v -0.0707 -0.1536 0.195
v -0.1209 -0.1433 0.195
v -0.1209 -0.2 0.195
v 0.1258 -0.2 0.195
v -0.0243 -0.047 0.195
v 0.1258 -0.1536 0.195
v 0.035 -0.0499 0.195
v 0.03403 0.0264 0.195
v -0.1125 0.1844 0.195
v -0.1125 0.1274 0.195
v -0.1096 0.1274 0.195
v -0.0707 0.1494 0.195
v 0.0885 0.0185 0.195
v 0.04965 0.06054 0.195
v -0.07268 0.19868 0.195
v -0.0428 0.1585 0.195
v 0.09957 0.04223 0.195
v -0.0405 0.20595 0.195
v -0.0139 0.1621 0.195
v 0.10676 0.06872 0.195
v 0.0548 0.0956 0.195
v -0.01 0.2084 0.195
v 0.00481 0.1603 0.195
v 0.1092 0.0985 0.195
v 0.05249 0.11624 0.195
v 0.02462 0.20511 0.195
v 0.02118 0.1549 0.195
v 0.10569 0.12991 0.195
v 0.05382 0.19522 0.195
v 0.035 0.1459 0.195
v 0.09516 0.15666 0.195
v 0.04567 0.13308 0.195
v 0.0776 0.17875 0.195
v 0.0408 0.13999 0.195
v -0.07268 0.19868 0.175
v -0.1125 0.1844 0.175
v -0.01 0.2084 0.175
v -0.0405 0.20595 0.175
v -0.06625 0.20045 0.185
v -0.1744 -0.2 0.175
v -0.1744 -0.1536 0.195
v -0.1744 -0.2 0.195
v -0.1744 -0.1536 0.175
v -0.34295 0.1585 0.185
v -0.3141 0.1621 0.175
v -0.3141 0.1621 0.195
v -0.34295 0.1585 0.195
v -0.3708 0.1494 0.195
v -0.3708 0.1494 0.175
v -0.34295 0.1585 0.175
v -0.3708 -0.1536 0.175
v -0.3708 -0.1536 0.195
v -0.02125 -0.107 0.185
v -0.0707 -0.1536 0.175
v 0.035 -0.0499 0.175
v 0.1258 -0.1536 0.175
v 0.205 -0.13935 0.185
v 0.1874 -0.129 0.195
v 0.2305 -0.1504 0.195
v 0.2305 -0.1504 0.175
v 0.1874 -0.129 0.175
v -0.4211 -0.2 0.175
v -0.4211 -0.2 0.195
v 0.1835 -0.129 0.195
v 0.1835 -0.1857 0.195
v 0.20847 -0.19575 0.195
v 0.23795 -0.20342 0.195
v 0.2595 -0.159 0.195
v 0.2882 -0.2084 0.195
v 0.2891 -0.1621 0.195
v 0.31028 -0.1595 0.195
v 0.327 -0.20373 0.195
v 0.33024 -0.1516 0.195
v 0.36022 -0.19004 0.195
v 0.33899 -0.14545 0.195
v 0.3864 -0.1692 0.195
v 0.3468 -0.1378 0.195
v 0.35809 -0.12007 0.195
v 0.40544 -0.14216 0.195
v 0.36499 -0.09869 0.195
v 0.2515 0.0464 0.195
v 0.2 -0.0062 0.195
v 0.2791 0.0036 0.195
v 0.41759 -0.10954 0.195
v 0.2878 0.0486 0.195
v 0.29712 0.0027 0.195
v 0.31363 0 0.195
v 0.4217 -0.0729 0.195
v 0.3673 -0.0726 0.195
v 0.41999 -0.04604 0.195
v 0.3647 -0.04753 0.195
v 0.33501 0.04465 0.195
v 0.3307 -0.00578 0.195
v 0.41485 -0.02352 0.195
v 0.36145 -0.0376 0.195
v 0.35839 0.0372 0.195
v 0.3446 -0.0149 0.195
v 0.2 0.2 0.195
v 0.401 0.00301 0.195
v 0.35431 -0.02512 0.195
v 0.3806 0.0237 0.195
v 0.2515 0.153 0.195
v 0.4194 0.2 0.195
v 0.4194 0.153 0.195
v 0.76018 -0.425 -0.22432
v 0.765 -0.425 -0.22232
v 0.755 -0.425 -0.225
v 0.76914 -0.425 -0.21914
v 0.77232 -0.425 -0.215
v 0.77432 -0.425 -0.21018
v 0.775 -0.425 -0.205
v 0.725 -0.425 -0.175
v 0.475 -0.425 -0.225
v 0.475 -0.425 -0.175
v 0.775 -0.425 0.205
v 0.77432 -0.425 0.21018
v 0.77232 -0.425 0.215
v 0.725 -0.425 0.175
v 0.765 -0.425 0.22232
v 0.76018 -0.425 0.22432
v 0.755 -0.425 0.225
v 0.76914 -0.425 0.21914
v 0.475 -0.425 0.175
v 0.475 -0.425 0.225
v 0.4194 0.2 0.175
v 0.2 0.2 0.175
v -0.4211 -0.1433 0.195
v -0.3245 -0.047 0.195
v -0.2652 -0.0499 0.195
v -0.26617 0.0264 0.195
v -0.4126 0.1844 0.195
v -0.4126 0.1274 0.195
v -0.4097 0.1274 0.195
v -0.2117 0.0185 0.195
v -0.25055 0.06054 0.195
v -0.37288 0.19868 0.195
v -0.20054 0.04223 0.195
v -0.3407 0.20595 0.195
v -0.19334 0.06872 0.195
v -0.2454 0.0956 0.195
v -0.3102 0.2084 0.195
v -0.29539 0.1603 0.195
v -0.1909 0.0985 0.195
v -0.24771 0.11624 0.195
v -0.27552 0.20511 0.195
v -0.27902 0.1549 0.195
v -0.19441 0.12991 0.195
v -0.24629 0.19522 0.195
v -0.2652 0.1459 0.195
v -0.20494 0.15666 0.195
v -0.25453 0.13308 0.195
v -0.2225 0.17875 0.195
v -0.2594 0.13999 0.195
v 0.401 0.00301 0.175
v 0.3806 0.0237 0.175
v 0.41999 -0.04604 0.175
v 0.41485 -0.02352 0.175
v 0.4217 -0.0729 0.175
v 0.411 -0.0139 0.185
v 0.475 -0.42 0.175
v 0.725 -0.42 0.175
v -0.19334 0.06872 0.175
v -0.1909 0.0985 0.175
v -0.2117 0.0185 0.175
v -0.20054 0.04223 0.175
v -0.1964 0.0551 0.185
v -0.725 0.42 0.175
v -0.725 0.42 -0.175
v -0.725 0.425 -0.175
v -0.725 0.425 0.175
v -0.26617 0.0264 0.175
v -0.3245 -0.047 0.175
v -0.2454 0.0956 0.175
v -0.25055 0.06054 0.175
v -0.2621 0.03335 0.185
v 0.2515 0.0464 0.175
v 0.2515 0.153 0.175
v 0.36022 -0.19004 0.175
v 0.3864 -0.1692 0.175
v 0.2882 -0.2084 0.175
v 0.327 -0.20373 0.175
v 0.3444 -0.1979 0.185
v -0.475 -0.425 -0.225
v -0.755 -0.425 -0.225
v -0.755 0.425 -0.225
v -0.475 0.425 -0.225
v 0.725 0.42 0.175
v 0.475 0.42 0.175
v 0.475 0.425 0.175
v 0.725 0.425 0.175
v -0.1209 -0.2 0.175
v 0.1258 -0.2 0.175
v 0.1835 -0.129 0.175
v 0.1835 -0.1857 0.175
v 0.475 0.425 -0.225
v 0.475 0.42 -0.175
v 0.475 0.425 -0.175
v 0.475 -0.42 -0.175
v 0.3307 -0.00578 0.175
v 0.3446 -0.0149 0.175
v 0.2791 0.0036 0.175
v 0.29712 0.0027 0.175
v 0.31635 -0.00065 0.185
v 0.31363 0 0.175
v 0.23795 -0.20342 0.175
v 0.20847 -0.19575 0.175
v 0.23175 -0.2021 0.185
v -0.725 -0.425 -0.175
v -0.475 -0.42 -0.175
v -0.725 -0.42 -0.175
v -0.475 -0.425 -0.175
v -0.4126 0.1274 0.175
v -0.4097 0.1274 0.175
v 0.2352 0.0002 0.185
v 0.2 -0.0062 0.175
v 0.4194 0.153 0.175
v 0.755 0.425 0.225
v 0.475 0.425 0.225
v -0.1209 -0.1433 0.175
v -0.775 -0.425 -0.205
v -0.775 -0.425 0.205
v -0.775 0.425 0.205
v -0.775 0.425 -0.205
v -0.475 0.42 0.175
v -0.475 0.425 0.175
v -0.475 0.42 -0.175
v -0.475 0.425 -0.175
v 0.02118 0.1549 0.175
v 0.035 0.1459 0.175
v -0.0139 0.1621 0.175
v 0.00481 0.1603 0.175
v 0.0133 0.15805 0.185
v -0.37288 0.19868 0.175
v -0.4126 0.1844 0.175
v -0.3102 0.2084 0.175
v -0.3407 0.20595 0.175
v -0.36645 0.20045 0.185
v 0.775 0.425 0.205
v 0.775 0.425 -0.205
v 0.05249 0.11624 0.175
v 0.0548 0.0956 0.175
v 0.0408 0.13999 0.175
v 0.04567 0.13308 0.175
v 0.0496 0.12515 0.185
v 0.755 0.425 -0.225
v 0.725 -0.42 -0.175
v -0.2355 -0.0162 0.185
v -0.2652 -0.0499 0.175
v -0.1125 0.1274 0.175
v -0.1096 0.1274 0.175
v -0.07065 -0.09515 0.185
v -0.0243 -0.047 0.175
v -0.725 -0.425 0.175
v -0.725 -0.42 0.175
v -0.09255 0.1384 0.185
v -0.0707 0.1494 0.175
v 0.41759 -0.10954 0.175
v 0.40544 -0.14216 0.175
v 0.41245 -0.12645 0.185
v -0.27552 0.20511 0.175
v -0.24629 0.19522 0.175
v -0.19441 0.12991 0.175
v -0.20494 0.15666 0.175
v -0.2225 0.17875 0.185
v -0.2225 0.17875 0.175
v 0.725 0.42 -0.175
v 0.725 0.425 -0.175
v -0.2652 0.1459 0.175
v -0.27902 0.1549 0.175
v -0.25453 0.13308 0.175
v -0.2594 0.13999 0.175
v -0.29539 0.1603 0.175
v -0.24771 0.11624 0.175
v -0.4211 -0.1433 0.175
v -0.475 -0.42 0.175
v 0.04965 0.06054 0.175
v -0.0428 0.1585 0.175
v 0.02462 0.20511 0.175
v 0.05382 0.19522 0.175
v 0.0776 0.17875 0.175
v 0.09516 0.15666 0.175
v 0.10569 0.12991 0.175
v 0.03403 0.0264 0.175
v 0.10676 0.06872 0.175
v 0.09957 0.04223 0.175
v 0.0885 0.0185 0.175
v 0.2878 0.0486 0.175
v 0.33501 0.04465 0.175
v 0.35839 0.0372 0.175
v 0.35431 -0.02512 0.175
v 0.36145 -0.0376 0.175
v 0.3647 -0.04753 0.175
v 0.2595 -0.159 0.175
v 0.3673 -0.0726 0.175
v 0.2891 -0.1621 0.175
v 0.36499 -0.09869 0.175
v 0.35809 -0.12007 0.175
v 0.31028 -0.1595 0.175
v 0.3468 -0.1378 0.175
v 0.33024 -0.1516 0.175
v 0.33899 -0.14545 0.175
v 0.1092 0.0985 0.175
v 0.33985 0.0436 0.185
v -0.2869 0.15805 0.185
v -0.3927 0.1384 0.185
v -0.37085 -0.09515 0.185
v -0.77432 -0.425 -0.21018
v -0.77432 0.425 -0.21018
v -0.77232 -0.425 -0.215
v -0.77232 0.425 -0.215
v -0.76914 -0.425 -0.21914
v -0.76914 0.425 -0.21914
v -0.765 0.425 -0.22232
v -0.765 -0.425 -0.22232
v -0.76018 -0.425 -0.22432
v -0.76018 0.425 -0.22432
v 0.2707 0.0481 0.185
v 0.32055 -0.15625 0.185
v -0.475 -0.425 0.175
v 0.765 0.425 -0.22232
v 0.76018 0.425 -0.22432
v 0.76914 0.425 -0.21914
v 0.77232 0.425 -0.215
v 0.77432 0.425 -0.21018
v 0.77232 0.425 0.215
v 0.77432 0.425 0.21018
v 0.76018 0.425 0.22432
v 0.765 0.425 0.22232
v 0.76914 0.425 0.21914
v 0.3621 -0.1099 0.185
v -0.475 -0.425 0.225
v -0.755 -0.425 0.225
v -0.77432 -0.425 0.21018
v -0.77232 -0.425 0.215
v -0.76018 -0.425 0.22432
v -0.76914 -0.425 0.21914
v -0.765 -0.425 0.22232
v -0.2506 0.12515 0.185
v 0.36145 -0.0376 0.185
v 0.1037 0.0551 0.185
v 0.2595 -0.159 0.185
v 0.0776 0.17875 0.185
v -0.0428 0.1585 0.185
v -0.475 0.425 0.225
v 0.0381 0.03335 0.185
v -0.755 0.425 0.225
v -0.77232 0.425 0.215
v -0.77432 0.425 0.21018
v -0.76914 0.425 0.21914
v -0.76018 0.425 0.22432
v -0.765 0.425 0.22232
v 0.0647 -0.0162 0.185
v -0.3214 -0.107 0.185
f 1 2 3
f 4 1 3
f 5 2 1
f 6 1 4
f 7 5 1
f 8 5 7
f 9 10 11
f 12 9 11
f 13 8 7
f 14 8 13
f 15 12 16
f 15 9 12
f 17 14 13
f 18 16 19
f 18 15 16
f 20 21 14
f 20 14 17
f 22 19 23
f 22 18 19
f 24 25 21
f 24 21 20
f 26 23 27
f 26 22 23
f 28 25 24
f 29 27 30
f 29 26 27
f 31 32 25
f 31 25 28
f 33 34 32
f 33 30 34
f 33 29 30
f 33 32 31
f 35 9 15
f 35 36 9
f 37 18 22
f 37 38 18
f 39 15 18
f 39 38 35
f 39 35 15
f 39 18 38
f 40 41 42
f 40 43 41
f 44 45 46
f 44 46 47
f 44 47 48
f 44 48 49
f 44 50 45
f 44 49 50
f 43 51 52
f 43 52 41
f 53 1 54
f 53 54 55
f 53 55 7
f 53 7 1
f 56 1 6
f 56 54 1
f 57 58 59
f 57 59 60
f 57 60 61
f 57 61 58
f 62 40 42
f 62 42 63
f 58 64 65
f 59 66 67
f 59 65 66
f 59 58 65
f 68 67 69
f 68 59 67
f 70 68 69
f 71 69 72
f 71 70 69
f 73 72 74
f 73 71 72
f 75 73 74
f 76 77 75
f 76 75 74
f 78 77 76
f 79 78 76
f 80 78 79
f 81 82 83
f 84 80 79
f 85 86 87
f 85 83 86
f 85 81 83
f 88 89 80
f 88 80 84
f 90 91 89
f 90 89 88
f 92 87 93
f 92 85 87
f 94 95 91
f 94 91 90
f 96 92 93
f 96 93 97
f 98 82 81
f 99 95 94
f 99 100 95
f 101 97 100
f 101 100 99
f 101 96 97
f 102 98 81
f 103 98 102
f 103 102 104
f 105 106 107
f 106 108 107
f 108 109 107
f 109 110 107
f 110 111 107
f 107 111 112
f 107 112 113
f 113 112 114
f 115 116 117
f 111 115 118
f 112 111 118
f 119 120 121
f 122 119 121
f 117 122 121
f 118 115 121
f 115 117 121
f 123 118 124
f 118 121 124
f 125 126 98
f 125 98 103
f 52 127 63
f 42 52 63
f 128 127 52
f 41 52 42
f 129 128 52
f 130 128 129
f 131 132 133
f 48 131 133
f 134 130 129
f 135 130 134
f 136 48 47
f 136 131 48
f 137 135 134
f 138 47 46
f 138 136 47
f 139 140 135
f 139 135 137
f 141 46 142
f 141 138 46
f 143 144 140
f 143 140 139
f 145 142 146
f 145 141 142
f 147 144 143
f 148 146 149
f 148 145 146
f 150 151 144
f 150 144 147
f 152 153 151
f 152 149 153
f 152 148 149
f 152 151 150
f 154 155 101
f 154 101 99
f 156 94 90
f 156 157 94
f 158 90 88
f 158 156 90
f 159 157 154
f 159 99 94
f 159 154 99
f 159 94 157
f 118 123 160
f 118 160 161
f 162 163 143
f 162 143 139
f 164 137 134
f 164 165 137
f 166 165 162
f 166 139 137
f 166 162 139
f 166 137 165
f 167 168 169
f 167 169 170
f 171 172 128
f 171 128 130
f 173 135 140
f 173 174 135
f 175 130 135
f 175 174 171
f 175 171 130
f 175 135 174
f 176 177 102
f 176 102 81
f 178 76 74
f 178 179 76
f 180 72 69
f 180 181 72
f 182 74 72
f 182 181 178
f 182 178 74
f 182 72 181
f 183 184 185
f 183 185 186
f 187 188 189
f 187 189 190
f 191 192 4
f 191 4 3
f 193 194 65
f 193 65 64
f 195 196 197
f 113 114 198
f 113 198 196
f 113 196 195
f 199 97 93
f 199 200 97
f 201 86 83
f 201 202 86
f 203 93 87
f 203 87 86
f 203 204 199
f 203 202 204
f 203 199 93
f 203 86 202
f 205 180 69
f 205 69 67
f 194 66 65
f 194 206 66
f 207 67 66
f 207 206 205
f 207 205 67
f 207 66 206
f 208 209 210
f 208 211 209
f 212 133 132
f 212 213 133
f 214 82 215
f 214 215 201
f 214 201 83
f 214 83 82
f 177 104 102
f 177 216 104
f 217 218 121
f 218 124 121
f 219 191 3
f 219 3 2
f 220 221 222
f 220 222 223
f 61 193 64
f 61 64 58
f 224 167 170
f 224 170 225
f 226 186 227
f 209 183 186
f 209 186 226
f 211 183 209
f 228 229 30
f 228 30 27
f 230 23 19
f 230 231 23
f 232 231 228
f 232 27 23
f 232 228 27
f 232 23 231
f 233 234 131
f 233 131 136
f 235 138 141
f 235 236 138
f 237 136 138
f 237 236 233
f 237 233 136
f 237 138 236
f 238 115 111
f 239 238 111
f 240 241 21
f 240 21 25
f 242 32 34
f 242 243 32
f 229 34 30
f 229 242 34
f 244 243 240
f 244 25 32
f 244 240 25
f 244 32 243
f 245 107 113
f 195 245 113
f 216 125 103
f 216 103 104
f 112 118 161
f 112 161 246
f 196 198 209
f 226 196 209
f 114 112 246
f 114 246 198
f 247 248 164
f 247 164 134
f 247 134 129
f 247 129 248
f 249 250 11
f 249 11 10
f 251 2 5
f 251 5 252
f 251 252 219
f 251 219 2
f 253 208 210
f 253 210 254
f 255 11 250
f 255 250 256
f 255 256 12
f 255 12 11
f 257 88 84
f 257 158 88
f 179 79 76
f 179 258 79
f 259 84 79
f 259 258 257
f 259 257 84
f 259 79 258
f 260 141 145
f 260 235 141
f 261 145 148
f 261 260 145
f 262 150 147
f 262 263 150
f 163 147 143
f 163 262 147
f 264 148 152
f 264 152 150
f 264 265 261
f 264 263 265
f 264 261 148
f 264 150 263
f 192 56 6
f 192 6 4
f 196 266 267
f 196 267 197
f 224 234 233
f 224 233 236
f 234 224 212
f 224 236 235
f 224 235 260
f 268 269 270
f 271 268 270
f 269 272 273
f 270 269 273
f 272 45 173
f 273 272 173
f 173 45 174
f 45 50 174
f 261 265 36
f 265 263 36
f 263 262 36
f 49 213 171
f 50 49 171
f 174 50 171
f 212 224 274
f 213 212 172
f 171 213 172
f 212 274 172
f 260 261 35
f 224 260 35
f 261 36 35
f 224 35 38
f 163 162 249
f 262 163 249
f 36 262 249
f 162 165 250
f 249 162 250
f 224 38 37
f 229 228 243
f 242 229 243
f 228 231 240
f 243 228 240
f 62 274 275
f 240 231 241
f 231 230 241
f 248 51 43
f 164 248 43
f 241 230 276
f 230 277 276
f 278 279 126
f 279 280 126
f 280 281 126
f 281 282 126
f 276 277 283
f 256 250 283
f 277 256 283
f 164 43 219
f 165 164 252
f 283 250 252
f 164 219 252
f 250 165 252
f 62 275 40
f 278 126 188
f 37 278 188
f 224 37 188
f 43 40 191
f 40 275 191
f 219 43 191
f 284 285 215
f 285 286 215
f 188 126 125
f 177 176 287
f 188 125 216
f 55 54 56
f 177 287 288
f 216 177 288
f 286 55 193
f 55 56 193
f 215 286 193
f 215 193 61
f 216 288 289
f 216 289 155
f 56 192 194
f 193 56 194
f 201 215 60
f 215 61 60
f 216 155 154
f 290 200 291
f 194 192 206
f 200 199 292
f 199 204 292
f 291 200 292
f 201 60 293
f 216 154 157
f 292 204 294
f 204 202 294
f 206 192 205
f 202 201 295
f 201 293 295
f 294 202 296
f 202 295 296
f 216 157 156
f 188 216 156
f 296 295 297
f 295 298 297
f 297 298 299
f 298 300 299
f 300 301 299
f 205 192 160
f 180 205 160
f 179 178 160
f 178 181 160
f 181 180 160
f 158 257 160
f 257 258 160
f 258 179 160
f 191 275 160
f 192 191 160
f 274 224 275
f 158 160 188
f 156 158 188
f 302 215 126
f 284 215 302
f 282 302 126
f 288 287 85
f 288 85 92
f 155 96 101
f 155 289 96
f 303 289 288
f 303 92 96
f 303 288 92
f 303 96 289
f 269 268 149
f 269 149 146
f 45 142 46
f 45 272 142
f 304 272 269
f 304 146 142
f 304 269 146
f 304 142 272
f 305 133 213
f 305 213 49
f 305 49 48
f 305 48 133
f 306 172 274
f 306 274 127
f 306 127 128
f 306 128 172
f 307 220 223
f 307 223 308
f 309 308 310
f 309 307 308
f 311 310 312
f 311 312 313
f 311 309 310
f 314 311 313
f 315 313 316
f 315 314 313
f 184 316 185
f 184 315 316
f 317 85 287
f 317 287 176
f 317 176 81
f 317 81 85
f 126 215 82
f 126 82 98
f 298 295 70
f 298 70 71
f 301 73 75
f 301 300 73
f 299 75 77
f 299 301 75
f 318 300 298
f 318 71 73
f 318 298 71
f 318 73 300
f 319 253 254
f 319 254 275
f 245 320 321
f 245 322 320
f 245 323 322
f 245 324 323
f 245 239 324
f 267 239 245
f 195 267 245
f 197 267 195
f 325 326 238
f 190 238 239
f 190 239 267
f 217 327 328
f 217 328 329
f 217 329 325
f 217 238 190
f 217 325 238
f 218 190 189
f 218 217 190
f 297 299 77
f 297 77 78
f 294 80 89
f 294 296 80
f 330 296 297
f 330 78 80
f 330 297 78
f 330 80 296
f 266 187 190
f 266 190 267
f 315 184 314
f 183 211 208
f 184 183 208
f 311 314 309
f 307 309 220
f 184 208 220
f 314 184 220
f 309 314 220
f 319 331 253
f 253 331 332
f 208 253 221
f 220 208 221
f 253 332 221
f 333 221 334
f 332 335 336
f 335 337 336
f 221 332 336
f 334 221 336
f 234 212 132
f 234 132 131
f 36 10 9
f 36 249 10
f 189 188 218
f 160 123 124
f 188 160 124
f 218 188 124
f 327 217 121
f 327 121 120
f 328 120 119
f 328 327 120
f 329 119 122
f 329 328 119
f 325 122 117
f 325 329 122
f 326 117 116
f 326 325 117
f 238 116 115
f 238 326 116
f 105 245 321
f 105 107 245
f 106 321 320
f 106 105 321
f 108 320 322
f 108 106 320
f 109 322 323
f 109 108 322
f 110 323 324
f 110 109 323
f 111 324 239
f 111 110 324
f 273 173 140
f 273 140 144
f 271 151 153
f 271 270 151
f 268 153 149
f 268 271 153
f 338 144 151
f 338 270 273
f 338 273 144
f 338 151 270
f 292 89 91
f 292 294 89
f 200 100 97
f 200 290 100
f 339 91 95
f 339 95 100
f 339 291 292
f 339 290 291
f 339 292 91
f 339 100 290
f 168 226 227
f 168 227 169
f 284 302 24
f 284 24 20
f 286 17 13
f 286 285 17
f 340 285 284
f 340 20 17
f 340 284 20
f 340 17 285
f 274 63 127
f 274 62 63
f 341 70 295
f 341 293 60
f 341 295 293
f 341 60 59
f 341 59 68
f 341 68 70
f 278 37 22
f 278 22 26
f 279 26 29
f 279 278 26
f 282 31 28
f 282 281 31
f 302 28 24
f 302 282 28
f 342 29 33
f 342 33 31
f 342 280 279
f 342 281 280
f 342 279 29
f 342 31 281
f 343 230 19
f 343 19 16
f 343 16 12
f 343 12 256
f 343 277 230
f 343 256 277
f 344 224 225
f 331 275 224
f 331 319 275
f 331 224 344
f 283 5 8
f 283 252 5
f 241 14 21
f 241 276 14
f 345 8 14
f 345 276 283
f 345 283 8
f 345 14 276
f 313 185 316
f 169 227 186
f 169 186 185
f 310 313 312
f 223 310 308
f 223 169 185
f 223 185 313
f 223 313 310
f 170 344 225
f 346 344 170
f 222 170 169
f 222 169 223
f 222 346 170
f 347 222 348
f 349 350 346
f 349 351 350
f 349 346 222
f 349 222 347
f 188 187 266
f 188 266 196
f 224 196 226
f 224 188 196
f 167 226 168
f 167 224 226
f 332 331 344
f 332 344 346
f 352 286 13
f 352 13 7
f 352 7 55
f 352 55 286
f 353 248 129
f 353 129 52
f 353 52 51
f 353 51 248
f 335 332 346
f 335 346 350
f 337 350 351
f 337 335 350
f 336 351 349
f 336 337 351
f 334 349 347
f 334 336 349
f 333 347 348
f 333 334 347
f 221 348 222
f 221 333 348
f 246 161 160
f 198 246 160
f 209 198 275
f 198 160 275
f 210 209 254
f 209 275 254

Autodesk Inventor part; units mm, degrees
ref_plane "YZ Plane" through (0, 0, 0) normal (1, 0, 0) x (0, 1, 0)
ref_plane "XZ Plane" through (0, 0, 0) normal (0, 1, 0) x (-1, 0, 0)
ref_plane "XY Plane" through (0, 0, 0) normal (0, 0, 1) x (1, 0, 0)
sketch "Sketch1" plane through (0, 0, 0) normal (0, 1, 0) x (-1, 0, 0)
  line L0 (0.725, 0.175) -> (-0.725, 0.175)
  line L1 (-0.725, 0.175) -> (-0.725, -0.175)
  line L2 (-0.725, -0.175) -> (0.725, -0.175)
  line L3 (0.725, -0.175) -> (0.725, 0.175)
  line L4 (0.475, 0.175) -> (0.475, 0.225)
  line L5 (0.475, 0.225) -> (0.775, 0.225)
  line L6 (0.775, 0.225) -> (0.775, -0.225)
  line L7 (0.775, -0.225) -> (0.475, -0.225)
  line L8 (0.475, -0.225) -> (0.475, -0.175)
  line L9 (-0.475, 0.175) -> (-0.475, 0.225)
  line L10 (-0.475, 0.225) -> (-0.775, 0.225)
  line L11 (-0.775, 0.225) -> (-0.775, -0.225)
  line L12 (-0.775, -0.225) -> (-0.475, -0.225)
  line L13 (-0.475, -0.175) -> (-0.475, -0.225)
  line L14 (0.475, 0.175) -> (-0.475, 0.175)
  point P0 (0, 0)
  point P1 (0, 0.175)
  point P2 (0.725, 0)
  dimension "d0" = 1.55
  dimension "d1" = 0.05
  dimension "d2" = 0.05
  dimension "d3" = 0.45
  dimension "d4" = 0.3
extrude "Extrusion1" add sketch "Sketch1" along normal mid plane 0.85 contours L0 L4 L5 L6 L7 L8 L2 L3 | L0 L1 L2 L13 L12 L11 L10 L9
extrude "Extrusion2" add sketch "Sketch1" along normal mid plane 0.84 contours L3 L2 L1 L0
sketch "Sketch2" plane through (-0.475, -0.42, 0.175) normal (0, 0, 1) x (1, 0, 0)
  line L0 (0, 0) -> (0, 0.84) projected
  line L1 (0.95, 0) -> (0, 0) projected
  line L2 (0.95, 0) -> (0.95, 0.84) projected
  line L3 (0, 0.84) -> (0.95, 0.84) projected
  line L4 (0, 0.42) -> (0.95, 0.42) construction
  line L5 (0.3006, 0.22) -> (0.0539, 0.22)
  line L6 (0.0539, 0.22) -> (0.0539, 0.2767)
  spline S0 degree 2 poles (0.0539, 0.2767) (0.0805, 0.3017) (0.1278, 0.348) (0.1505, 0.373) knots 0 0 0 1 2 2 2
  spline S1 degree 2 poles (0.1505, 0.373) (0.1962, 0.4232) (0.2296, 0.4835) (0.2296, 0.5156) knots 0 0 0 1 2 2 2
  spline S2 degree 2 poles (0.2296, 0.5156) (0.2296, 0.5325) (0.2192, 0.5578) (0.2098, 0.5659) knots 0 0 0 1 2 2 2
  spline S3 degree 2 poles (0.2098, 0.5659) (0.2004, 0.574) (0.1758, 0.5821) (0.1609, 0.5821) knots 0 0 0 1 2 2 2
  spline S4 degree 2 poles (0.1609, 0.5821) (0.1466, 0.5821) (0.1175, 0.5749) (0.1042, 0.5694) knots 0 0 0 1 2 2 2
  spline S5 degree 2 poles (0.1042, 0.5694) (0.0928, 0.5649) (0.0718, 0.5519) (0.0653, 0.5474) knots 0 0 0 1 2 2 2
  line L7 (0.0653, 0.5474) -> (0.0624, 0.5474)
  line L8 (0.0624, 0.5474) -> (0.0624, 0.6044)
  spline S6 degree 2 poles (0.0624, 0.6044) (0.0789, 0.6125) (0.1382, 0.6284) (0.1648, 0.6284) knots 0 0 0 1 2 2 2
  spline S7 degree 2 poles (0.1648, 0.6284) (0.2209, 0.6284) (0.2841, 0.5691) (0.2841, 0.5185) knots 0 0 0 1 2 2 2
  spline S8 degree 2 poles (0.2841, 0.5185) (0.2841, 0.4949) (0.2731, 0.4553) (0.2633, 0.4385) knots 0 0 0 1 2 2 2
  spline S9 degree 2 poles (0.2633, 0.4385) (0.2536, 0.421) (0.2254, 0.3866) (0.2098, 0.3701) knots 0 0 0 1 2 2 2
  spline S10 degree 2 poles (0.2098, 0.3701) (0.1846, 0.3425) (0.1226, 0.2835) (0.1042, 0.2664) knots 0 0 0 1 2 2 2
  line L9 (0.1042, 0.2664) -> (0.3006, 0.2664)
  line L10 (0.3006, 0.2664) -> (0.3006, 0.22)
  line L11 (0.6008, 0.22) -> (0.3541, 0.22)
  line L12 (0.3541, 0.22) -> (0.3541, 0.2767)
  spline S11 degree 2 poles (0.3541, 0.2767) (0.3807, 0.3017) (0.428, 0.348) (0.4507, 0.373) knots 0 0 0 1 2 2 2
  spline S12 degree 2 poles (0.4507, 0.373) (0.4964, 0.4232) (0.5298, 0.4835) (0.5298, 0.5156) knots 0 0 0 1 2 2 2
  spline S13 degree 2 poles (0.5298, 0.5156) (0.5298, 0.5325) (0.5194, 0.5578) (0.51, 0.5659) knots 0 0 0 1 2 2 2
  spline S14 degree 2 poles (0.51, 0.5659) (0.5006, 0.574) (0.476, 0.5821) (0.4611, 0.5821) knots 0 0 0 1 2 2 2
  spline S15 degree 2 poles (0.4611, 0.5821) (0.4468, 0.5821) (0.4176, 0.5749) (0.4043, 0.5694) knots 0 0 0 1 2 2 2
  spline S16 degree 2 poles (0.4043, 0.5694) (0.393, 0.5649) (0.3719, 0.5519) (0.3654, 0.5474) knots 0 0 0 1 2 2 2
  line L13 (0.3654, 0.5474) -> (0.3625, 0.5474)
  line L14 (0.3625, 0.5474) -> (0.3625, 0.6044)
  spline S17 degree 2 poles (0.3625, 0.6044) (0.3791, 0.6125) (0.4384, 0.6284) (0.465, 0.6284) knots 0 0 0 1 2 2 2
  spline S18 degree 2 poles (0.465, 0.6284) (0.521, 0.6284) (0.5842, 0.5691) (0.5842, 0.5185) knots 0 0 0 1 2 2 2
  spline S19 degree 2 poles (0.5842, 0.5185) (0.5842, 0.4949) (0.5732, 0.4553) (0.5635, 0.4385) knots 0 0 0 1 2 2 2
  spline S20 degree 2 poles (0.5635, 0.4385) (0.5538, 0.421) (0.5256, 0.3866) (0.51, 0.3701) knots 0 0 0 1 2 2 2
  spline S21 degree 2 poles (0.51, 0.3701) (0.4847, 0.3425) (0.4228, 0.2835) (0.4043, 0.2664) knots 0 0 0 1 2 2 2
  line L15 (0.4043, 0.2664) -> (0.6008, 0.2664)
  line L16 (0.6008, 0.2664) -> (0.6008, 0.22)
  spline S22 degree 2 poles (0.8967, 0.3471) (0.8967, 0.3182) (0.8782, 0.2689) (0.8614, 0.2508) knots 0 0 0 1 2 2 2
  spline S23 degree 2 poles (0.8614, 0.2508) (0.8445, 0.2326) (0.7943, 0.2116) (0.7632, 0.2116) knots 0 0 0 1 2 2 2
  spline S24 degree 2 poles (0.7632, 0.2116) (0.7346, 0.2116) (0.6789, 0.2242) (0.6585, 0.2343) knots 0 0 0 1 2 2 2
  line L17 (0.6585, 0.2343) -> (0.6585, 0.291)
  line L18 (0.6585, 0.291) -> (0.6624, 0.291)
  spline S25 degree 2 poles (0.6624, 0.291) (0.6685, 0.2865) (0.6915, 0.2748) (0.7055, 0.2696) knots 0 0 0 1 2 2 2
  spline S26 degree 2 poles (0.7055, 0.2696) (0.7214, 0.2641) (0.7476, 0.2579) (0.7641, 0.2579) knots 0 0 0 1 2 2 2
  spline S27 degree 2 poles (0.7641, 0.2579) (0.7803, 0.2579) (0.8108, 0.2696) (0.8218, 0.2822) knots 0 0 0 1 2 2 2
  spline S28 degree 2 poles (0.8218, 0.2822) (0.8319, 0.2942) (0.8423, 0.326) (0.8423, 0.3474) knots 0 0 0 1 2 2 2
  spline S29 degree 2 poles (0.8423, 0.3474) (0.8423, 0.3688) (0.8306, 0.396) (0.8196, 0.4051) knots 0 0 0 1 2 2 2
  spline S30 degree 2 poles (0.8196, 0.4051) (0.8082, 0.4151) (0.7745, 0.4236) (0.7541, 0.4236) knots 0 0 0 1 2 2 2
  spline S31 degree 2 poles (0.7541, 0.4236) (0.7321, 0.4236) (0.6883, 0.4168) (0.675, 0.4138) knots 0 0 0 1 2 2 2
  line L19 (0.675, 0.4138) -> (0.675, 0.62)
  line L20 (0.675, 0.62) -> (0.8944, 0.62)
  line L21 (0.8944, 0.62) -> (0.8944, 0.573)
  line L22 (0.8944, 0.573) -> (0.7265, 0.573)
  line L23 (0.7265, 0.573) -> (0.7265, 0.4664)
  spline S32 degree 2 poles (0.7265, 0.4664) (0.7363, 0.4676) (0.7551, 0.4686) (0.7628, 0.4686) knots 0 0 0 1 2 2 2
  spline S33 degree 2 poles (0.7628, 0.4686) (0.7936, 0.4686) (0.8361, 0.4586) (0.8556, 0.4437) knots 0 0 0 1 2 2 2
  spline S34 degree 2 poles (0.8556, 0.4437) (0.8753, 0.4288) (0.8967, 0.3834) (0.8967, 0.3471) knots 0 0 0 1 2 2 2
  point P0 (0.475, 0.42)
extrude "Extrusion3" add sketch "Sketch2" along normal blind 0.02 contours L5 L6 S0 S1 S2 S3 S4 S5 L7 L8 S6 S7 S8 S9 S10 L9 L10 | L11 L12 S11 S12 S13 S14 S15 S16 L13 L14 S17 S18 S19 S20 S21 L15 L16 | S22 S23 S24 L17 L18 S25 S26 S27 S28 S29 S30 S31 L19 L20 L21 L22 L23 S32 S33 S34
fillet "Fillet1" radius 0.02 4 edges at (-0.775, 0, 0.225) (-0.775, 0, -0.225) (0.775, 0, 0.225) (0.775, 0, -0.225)
equation "\"d2\" = d1"
properties part number "21-1001" material "Copper"
